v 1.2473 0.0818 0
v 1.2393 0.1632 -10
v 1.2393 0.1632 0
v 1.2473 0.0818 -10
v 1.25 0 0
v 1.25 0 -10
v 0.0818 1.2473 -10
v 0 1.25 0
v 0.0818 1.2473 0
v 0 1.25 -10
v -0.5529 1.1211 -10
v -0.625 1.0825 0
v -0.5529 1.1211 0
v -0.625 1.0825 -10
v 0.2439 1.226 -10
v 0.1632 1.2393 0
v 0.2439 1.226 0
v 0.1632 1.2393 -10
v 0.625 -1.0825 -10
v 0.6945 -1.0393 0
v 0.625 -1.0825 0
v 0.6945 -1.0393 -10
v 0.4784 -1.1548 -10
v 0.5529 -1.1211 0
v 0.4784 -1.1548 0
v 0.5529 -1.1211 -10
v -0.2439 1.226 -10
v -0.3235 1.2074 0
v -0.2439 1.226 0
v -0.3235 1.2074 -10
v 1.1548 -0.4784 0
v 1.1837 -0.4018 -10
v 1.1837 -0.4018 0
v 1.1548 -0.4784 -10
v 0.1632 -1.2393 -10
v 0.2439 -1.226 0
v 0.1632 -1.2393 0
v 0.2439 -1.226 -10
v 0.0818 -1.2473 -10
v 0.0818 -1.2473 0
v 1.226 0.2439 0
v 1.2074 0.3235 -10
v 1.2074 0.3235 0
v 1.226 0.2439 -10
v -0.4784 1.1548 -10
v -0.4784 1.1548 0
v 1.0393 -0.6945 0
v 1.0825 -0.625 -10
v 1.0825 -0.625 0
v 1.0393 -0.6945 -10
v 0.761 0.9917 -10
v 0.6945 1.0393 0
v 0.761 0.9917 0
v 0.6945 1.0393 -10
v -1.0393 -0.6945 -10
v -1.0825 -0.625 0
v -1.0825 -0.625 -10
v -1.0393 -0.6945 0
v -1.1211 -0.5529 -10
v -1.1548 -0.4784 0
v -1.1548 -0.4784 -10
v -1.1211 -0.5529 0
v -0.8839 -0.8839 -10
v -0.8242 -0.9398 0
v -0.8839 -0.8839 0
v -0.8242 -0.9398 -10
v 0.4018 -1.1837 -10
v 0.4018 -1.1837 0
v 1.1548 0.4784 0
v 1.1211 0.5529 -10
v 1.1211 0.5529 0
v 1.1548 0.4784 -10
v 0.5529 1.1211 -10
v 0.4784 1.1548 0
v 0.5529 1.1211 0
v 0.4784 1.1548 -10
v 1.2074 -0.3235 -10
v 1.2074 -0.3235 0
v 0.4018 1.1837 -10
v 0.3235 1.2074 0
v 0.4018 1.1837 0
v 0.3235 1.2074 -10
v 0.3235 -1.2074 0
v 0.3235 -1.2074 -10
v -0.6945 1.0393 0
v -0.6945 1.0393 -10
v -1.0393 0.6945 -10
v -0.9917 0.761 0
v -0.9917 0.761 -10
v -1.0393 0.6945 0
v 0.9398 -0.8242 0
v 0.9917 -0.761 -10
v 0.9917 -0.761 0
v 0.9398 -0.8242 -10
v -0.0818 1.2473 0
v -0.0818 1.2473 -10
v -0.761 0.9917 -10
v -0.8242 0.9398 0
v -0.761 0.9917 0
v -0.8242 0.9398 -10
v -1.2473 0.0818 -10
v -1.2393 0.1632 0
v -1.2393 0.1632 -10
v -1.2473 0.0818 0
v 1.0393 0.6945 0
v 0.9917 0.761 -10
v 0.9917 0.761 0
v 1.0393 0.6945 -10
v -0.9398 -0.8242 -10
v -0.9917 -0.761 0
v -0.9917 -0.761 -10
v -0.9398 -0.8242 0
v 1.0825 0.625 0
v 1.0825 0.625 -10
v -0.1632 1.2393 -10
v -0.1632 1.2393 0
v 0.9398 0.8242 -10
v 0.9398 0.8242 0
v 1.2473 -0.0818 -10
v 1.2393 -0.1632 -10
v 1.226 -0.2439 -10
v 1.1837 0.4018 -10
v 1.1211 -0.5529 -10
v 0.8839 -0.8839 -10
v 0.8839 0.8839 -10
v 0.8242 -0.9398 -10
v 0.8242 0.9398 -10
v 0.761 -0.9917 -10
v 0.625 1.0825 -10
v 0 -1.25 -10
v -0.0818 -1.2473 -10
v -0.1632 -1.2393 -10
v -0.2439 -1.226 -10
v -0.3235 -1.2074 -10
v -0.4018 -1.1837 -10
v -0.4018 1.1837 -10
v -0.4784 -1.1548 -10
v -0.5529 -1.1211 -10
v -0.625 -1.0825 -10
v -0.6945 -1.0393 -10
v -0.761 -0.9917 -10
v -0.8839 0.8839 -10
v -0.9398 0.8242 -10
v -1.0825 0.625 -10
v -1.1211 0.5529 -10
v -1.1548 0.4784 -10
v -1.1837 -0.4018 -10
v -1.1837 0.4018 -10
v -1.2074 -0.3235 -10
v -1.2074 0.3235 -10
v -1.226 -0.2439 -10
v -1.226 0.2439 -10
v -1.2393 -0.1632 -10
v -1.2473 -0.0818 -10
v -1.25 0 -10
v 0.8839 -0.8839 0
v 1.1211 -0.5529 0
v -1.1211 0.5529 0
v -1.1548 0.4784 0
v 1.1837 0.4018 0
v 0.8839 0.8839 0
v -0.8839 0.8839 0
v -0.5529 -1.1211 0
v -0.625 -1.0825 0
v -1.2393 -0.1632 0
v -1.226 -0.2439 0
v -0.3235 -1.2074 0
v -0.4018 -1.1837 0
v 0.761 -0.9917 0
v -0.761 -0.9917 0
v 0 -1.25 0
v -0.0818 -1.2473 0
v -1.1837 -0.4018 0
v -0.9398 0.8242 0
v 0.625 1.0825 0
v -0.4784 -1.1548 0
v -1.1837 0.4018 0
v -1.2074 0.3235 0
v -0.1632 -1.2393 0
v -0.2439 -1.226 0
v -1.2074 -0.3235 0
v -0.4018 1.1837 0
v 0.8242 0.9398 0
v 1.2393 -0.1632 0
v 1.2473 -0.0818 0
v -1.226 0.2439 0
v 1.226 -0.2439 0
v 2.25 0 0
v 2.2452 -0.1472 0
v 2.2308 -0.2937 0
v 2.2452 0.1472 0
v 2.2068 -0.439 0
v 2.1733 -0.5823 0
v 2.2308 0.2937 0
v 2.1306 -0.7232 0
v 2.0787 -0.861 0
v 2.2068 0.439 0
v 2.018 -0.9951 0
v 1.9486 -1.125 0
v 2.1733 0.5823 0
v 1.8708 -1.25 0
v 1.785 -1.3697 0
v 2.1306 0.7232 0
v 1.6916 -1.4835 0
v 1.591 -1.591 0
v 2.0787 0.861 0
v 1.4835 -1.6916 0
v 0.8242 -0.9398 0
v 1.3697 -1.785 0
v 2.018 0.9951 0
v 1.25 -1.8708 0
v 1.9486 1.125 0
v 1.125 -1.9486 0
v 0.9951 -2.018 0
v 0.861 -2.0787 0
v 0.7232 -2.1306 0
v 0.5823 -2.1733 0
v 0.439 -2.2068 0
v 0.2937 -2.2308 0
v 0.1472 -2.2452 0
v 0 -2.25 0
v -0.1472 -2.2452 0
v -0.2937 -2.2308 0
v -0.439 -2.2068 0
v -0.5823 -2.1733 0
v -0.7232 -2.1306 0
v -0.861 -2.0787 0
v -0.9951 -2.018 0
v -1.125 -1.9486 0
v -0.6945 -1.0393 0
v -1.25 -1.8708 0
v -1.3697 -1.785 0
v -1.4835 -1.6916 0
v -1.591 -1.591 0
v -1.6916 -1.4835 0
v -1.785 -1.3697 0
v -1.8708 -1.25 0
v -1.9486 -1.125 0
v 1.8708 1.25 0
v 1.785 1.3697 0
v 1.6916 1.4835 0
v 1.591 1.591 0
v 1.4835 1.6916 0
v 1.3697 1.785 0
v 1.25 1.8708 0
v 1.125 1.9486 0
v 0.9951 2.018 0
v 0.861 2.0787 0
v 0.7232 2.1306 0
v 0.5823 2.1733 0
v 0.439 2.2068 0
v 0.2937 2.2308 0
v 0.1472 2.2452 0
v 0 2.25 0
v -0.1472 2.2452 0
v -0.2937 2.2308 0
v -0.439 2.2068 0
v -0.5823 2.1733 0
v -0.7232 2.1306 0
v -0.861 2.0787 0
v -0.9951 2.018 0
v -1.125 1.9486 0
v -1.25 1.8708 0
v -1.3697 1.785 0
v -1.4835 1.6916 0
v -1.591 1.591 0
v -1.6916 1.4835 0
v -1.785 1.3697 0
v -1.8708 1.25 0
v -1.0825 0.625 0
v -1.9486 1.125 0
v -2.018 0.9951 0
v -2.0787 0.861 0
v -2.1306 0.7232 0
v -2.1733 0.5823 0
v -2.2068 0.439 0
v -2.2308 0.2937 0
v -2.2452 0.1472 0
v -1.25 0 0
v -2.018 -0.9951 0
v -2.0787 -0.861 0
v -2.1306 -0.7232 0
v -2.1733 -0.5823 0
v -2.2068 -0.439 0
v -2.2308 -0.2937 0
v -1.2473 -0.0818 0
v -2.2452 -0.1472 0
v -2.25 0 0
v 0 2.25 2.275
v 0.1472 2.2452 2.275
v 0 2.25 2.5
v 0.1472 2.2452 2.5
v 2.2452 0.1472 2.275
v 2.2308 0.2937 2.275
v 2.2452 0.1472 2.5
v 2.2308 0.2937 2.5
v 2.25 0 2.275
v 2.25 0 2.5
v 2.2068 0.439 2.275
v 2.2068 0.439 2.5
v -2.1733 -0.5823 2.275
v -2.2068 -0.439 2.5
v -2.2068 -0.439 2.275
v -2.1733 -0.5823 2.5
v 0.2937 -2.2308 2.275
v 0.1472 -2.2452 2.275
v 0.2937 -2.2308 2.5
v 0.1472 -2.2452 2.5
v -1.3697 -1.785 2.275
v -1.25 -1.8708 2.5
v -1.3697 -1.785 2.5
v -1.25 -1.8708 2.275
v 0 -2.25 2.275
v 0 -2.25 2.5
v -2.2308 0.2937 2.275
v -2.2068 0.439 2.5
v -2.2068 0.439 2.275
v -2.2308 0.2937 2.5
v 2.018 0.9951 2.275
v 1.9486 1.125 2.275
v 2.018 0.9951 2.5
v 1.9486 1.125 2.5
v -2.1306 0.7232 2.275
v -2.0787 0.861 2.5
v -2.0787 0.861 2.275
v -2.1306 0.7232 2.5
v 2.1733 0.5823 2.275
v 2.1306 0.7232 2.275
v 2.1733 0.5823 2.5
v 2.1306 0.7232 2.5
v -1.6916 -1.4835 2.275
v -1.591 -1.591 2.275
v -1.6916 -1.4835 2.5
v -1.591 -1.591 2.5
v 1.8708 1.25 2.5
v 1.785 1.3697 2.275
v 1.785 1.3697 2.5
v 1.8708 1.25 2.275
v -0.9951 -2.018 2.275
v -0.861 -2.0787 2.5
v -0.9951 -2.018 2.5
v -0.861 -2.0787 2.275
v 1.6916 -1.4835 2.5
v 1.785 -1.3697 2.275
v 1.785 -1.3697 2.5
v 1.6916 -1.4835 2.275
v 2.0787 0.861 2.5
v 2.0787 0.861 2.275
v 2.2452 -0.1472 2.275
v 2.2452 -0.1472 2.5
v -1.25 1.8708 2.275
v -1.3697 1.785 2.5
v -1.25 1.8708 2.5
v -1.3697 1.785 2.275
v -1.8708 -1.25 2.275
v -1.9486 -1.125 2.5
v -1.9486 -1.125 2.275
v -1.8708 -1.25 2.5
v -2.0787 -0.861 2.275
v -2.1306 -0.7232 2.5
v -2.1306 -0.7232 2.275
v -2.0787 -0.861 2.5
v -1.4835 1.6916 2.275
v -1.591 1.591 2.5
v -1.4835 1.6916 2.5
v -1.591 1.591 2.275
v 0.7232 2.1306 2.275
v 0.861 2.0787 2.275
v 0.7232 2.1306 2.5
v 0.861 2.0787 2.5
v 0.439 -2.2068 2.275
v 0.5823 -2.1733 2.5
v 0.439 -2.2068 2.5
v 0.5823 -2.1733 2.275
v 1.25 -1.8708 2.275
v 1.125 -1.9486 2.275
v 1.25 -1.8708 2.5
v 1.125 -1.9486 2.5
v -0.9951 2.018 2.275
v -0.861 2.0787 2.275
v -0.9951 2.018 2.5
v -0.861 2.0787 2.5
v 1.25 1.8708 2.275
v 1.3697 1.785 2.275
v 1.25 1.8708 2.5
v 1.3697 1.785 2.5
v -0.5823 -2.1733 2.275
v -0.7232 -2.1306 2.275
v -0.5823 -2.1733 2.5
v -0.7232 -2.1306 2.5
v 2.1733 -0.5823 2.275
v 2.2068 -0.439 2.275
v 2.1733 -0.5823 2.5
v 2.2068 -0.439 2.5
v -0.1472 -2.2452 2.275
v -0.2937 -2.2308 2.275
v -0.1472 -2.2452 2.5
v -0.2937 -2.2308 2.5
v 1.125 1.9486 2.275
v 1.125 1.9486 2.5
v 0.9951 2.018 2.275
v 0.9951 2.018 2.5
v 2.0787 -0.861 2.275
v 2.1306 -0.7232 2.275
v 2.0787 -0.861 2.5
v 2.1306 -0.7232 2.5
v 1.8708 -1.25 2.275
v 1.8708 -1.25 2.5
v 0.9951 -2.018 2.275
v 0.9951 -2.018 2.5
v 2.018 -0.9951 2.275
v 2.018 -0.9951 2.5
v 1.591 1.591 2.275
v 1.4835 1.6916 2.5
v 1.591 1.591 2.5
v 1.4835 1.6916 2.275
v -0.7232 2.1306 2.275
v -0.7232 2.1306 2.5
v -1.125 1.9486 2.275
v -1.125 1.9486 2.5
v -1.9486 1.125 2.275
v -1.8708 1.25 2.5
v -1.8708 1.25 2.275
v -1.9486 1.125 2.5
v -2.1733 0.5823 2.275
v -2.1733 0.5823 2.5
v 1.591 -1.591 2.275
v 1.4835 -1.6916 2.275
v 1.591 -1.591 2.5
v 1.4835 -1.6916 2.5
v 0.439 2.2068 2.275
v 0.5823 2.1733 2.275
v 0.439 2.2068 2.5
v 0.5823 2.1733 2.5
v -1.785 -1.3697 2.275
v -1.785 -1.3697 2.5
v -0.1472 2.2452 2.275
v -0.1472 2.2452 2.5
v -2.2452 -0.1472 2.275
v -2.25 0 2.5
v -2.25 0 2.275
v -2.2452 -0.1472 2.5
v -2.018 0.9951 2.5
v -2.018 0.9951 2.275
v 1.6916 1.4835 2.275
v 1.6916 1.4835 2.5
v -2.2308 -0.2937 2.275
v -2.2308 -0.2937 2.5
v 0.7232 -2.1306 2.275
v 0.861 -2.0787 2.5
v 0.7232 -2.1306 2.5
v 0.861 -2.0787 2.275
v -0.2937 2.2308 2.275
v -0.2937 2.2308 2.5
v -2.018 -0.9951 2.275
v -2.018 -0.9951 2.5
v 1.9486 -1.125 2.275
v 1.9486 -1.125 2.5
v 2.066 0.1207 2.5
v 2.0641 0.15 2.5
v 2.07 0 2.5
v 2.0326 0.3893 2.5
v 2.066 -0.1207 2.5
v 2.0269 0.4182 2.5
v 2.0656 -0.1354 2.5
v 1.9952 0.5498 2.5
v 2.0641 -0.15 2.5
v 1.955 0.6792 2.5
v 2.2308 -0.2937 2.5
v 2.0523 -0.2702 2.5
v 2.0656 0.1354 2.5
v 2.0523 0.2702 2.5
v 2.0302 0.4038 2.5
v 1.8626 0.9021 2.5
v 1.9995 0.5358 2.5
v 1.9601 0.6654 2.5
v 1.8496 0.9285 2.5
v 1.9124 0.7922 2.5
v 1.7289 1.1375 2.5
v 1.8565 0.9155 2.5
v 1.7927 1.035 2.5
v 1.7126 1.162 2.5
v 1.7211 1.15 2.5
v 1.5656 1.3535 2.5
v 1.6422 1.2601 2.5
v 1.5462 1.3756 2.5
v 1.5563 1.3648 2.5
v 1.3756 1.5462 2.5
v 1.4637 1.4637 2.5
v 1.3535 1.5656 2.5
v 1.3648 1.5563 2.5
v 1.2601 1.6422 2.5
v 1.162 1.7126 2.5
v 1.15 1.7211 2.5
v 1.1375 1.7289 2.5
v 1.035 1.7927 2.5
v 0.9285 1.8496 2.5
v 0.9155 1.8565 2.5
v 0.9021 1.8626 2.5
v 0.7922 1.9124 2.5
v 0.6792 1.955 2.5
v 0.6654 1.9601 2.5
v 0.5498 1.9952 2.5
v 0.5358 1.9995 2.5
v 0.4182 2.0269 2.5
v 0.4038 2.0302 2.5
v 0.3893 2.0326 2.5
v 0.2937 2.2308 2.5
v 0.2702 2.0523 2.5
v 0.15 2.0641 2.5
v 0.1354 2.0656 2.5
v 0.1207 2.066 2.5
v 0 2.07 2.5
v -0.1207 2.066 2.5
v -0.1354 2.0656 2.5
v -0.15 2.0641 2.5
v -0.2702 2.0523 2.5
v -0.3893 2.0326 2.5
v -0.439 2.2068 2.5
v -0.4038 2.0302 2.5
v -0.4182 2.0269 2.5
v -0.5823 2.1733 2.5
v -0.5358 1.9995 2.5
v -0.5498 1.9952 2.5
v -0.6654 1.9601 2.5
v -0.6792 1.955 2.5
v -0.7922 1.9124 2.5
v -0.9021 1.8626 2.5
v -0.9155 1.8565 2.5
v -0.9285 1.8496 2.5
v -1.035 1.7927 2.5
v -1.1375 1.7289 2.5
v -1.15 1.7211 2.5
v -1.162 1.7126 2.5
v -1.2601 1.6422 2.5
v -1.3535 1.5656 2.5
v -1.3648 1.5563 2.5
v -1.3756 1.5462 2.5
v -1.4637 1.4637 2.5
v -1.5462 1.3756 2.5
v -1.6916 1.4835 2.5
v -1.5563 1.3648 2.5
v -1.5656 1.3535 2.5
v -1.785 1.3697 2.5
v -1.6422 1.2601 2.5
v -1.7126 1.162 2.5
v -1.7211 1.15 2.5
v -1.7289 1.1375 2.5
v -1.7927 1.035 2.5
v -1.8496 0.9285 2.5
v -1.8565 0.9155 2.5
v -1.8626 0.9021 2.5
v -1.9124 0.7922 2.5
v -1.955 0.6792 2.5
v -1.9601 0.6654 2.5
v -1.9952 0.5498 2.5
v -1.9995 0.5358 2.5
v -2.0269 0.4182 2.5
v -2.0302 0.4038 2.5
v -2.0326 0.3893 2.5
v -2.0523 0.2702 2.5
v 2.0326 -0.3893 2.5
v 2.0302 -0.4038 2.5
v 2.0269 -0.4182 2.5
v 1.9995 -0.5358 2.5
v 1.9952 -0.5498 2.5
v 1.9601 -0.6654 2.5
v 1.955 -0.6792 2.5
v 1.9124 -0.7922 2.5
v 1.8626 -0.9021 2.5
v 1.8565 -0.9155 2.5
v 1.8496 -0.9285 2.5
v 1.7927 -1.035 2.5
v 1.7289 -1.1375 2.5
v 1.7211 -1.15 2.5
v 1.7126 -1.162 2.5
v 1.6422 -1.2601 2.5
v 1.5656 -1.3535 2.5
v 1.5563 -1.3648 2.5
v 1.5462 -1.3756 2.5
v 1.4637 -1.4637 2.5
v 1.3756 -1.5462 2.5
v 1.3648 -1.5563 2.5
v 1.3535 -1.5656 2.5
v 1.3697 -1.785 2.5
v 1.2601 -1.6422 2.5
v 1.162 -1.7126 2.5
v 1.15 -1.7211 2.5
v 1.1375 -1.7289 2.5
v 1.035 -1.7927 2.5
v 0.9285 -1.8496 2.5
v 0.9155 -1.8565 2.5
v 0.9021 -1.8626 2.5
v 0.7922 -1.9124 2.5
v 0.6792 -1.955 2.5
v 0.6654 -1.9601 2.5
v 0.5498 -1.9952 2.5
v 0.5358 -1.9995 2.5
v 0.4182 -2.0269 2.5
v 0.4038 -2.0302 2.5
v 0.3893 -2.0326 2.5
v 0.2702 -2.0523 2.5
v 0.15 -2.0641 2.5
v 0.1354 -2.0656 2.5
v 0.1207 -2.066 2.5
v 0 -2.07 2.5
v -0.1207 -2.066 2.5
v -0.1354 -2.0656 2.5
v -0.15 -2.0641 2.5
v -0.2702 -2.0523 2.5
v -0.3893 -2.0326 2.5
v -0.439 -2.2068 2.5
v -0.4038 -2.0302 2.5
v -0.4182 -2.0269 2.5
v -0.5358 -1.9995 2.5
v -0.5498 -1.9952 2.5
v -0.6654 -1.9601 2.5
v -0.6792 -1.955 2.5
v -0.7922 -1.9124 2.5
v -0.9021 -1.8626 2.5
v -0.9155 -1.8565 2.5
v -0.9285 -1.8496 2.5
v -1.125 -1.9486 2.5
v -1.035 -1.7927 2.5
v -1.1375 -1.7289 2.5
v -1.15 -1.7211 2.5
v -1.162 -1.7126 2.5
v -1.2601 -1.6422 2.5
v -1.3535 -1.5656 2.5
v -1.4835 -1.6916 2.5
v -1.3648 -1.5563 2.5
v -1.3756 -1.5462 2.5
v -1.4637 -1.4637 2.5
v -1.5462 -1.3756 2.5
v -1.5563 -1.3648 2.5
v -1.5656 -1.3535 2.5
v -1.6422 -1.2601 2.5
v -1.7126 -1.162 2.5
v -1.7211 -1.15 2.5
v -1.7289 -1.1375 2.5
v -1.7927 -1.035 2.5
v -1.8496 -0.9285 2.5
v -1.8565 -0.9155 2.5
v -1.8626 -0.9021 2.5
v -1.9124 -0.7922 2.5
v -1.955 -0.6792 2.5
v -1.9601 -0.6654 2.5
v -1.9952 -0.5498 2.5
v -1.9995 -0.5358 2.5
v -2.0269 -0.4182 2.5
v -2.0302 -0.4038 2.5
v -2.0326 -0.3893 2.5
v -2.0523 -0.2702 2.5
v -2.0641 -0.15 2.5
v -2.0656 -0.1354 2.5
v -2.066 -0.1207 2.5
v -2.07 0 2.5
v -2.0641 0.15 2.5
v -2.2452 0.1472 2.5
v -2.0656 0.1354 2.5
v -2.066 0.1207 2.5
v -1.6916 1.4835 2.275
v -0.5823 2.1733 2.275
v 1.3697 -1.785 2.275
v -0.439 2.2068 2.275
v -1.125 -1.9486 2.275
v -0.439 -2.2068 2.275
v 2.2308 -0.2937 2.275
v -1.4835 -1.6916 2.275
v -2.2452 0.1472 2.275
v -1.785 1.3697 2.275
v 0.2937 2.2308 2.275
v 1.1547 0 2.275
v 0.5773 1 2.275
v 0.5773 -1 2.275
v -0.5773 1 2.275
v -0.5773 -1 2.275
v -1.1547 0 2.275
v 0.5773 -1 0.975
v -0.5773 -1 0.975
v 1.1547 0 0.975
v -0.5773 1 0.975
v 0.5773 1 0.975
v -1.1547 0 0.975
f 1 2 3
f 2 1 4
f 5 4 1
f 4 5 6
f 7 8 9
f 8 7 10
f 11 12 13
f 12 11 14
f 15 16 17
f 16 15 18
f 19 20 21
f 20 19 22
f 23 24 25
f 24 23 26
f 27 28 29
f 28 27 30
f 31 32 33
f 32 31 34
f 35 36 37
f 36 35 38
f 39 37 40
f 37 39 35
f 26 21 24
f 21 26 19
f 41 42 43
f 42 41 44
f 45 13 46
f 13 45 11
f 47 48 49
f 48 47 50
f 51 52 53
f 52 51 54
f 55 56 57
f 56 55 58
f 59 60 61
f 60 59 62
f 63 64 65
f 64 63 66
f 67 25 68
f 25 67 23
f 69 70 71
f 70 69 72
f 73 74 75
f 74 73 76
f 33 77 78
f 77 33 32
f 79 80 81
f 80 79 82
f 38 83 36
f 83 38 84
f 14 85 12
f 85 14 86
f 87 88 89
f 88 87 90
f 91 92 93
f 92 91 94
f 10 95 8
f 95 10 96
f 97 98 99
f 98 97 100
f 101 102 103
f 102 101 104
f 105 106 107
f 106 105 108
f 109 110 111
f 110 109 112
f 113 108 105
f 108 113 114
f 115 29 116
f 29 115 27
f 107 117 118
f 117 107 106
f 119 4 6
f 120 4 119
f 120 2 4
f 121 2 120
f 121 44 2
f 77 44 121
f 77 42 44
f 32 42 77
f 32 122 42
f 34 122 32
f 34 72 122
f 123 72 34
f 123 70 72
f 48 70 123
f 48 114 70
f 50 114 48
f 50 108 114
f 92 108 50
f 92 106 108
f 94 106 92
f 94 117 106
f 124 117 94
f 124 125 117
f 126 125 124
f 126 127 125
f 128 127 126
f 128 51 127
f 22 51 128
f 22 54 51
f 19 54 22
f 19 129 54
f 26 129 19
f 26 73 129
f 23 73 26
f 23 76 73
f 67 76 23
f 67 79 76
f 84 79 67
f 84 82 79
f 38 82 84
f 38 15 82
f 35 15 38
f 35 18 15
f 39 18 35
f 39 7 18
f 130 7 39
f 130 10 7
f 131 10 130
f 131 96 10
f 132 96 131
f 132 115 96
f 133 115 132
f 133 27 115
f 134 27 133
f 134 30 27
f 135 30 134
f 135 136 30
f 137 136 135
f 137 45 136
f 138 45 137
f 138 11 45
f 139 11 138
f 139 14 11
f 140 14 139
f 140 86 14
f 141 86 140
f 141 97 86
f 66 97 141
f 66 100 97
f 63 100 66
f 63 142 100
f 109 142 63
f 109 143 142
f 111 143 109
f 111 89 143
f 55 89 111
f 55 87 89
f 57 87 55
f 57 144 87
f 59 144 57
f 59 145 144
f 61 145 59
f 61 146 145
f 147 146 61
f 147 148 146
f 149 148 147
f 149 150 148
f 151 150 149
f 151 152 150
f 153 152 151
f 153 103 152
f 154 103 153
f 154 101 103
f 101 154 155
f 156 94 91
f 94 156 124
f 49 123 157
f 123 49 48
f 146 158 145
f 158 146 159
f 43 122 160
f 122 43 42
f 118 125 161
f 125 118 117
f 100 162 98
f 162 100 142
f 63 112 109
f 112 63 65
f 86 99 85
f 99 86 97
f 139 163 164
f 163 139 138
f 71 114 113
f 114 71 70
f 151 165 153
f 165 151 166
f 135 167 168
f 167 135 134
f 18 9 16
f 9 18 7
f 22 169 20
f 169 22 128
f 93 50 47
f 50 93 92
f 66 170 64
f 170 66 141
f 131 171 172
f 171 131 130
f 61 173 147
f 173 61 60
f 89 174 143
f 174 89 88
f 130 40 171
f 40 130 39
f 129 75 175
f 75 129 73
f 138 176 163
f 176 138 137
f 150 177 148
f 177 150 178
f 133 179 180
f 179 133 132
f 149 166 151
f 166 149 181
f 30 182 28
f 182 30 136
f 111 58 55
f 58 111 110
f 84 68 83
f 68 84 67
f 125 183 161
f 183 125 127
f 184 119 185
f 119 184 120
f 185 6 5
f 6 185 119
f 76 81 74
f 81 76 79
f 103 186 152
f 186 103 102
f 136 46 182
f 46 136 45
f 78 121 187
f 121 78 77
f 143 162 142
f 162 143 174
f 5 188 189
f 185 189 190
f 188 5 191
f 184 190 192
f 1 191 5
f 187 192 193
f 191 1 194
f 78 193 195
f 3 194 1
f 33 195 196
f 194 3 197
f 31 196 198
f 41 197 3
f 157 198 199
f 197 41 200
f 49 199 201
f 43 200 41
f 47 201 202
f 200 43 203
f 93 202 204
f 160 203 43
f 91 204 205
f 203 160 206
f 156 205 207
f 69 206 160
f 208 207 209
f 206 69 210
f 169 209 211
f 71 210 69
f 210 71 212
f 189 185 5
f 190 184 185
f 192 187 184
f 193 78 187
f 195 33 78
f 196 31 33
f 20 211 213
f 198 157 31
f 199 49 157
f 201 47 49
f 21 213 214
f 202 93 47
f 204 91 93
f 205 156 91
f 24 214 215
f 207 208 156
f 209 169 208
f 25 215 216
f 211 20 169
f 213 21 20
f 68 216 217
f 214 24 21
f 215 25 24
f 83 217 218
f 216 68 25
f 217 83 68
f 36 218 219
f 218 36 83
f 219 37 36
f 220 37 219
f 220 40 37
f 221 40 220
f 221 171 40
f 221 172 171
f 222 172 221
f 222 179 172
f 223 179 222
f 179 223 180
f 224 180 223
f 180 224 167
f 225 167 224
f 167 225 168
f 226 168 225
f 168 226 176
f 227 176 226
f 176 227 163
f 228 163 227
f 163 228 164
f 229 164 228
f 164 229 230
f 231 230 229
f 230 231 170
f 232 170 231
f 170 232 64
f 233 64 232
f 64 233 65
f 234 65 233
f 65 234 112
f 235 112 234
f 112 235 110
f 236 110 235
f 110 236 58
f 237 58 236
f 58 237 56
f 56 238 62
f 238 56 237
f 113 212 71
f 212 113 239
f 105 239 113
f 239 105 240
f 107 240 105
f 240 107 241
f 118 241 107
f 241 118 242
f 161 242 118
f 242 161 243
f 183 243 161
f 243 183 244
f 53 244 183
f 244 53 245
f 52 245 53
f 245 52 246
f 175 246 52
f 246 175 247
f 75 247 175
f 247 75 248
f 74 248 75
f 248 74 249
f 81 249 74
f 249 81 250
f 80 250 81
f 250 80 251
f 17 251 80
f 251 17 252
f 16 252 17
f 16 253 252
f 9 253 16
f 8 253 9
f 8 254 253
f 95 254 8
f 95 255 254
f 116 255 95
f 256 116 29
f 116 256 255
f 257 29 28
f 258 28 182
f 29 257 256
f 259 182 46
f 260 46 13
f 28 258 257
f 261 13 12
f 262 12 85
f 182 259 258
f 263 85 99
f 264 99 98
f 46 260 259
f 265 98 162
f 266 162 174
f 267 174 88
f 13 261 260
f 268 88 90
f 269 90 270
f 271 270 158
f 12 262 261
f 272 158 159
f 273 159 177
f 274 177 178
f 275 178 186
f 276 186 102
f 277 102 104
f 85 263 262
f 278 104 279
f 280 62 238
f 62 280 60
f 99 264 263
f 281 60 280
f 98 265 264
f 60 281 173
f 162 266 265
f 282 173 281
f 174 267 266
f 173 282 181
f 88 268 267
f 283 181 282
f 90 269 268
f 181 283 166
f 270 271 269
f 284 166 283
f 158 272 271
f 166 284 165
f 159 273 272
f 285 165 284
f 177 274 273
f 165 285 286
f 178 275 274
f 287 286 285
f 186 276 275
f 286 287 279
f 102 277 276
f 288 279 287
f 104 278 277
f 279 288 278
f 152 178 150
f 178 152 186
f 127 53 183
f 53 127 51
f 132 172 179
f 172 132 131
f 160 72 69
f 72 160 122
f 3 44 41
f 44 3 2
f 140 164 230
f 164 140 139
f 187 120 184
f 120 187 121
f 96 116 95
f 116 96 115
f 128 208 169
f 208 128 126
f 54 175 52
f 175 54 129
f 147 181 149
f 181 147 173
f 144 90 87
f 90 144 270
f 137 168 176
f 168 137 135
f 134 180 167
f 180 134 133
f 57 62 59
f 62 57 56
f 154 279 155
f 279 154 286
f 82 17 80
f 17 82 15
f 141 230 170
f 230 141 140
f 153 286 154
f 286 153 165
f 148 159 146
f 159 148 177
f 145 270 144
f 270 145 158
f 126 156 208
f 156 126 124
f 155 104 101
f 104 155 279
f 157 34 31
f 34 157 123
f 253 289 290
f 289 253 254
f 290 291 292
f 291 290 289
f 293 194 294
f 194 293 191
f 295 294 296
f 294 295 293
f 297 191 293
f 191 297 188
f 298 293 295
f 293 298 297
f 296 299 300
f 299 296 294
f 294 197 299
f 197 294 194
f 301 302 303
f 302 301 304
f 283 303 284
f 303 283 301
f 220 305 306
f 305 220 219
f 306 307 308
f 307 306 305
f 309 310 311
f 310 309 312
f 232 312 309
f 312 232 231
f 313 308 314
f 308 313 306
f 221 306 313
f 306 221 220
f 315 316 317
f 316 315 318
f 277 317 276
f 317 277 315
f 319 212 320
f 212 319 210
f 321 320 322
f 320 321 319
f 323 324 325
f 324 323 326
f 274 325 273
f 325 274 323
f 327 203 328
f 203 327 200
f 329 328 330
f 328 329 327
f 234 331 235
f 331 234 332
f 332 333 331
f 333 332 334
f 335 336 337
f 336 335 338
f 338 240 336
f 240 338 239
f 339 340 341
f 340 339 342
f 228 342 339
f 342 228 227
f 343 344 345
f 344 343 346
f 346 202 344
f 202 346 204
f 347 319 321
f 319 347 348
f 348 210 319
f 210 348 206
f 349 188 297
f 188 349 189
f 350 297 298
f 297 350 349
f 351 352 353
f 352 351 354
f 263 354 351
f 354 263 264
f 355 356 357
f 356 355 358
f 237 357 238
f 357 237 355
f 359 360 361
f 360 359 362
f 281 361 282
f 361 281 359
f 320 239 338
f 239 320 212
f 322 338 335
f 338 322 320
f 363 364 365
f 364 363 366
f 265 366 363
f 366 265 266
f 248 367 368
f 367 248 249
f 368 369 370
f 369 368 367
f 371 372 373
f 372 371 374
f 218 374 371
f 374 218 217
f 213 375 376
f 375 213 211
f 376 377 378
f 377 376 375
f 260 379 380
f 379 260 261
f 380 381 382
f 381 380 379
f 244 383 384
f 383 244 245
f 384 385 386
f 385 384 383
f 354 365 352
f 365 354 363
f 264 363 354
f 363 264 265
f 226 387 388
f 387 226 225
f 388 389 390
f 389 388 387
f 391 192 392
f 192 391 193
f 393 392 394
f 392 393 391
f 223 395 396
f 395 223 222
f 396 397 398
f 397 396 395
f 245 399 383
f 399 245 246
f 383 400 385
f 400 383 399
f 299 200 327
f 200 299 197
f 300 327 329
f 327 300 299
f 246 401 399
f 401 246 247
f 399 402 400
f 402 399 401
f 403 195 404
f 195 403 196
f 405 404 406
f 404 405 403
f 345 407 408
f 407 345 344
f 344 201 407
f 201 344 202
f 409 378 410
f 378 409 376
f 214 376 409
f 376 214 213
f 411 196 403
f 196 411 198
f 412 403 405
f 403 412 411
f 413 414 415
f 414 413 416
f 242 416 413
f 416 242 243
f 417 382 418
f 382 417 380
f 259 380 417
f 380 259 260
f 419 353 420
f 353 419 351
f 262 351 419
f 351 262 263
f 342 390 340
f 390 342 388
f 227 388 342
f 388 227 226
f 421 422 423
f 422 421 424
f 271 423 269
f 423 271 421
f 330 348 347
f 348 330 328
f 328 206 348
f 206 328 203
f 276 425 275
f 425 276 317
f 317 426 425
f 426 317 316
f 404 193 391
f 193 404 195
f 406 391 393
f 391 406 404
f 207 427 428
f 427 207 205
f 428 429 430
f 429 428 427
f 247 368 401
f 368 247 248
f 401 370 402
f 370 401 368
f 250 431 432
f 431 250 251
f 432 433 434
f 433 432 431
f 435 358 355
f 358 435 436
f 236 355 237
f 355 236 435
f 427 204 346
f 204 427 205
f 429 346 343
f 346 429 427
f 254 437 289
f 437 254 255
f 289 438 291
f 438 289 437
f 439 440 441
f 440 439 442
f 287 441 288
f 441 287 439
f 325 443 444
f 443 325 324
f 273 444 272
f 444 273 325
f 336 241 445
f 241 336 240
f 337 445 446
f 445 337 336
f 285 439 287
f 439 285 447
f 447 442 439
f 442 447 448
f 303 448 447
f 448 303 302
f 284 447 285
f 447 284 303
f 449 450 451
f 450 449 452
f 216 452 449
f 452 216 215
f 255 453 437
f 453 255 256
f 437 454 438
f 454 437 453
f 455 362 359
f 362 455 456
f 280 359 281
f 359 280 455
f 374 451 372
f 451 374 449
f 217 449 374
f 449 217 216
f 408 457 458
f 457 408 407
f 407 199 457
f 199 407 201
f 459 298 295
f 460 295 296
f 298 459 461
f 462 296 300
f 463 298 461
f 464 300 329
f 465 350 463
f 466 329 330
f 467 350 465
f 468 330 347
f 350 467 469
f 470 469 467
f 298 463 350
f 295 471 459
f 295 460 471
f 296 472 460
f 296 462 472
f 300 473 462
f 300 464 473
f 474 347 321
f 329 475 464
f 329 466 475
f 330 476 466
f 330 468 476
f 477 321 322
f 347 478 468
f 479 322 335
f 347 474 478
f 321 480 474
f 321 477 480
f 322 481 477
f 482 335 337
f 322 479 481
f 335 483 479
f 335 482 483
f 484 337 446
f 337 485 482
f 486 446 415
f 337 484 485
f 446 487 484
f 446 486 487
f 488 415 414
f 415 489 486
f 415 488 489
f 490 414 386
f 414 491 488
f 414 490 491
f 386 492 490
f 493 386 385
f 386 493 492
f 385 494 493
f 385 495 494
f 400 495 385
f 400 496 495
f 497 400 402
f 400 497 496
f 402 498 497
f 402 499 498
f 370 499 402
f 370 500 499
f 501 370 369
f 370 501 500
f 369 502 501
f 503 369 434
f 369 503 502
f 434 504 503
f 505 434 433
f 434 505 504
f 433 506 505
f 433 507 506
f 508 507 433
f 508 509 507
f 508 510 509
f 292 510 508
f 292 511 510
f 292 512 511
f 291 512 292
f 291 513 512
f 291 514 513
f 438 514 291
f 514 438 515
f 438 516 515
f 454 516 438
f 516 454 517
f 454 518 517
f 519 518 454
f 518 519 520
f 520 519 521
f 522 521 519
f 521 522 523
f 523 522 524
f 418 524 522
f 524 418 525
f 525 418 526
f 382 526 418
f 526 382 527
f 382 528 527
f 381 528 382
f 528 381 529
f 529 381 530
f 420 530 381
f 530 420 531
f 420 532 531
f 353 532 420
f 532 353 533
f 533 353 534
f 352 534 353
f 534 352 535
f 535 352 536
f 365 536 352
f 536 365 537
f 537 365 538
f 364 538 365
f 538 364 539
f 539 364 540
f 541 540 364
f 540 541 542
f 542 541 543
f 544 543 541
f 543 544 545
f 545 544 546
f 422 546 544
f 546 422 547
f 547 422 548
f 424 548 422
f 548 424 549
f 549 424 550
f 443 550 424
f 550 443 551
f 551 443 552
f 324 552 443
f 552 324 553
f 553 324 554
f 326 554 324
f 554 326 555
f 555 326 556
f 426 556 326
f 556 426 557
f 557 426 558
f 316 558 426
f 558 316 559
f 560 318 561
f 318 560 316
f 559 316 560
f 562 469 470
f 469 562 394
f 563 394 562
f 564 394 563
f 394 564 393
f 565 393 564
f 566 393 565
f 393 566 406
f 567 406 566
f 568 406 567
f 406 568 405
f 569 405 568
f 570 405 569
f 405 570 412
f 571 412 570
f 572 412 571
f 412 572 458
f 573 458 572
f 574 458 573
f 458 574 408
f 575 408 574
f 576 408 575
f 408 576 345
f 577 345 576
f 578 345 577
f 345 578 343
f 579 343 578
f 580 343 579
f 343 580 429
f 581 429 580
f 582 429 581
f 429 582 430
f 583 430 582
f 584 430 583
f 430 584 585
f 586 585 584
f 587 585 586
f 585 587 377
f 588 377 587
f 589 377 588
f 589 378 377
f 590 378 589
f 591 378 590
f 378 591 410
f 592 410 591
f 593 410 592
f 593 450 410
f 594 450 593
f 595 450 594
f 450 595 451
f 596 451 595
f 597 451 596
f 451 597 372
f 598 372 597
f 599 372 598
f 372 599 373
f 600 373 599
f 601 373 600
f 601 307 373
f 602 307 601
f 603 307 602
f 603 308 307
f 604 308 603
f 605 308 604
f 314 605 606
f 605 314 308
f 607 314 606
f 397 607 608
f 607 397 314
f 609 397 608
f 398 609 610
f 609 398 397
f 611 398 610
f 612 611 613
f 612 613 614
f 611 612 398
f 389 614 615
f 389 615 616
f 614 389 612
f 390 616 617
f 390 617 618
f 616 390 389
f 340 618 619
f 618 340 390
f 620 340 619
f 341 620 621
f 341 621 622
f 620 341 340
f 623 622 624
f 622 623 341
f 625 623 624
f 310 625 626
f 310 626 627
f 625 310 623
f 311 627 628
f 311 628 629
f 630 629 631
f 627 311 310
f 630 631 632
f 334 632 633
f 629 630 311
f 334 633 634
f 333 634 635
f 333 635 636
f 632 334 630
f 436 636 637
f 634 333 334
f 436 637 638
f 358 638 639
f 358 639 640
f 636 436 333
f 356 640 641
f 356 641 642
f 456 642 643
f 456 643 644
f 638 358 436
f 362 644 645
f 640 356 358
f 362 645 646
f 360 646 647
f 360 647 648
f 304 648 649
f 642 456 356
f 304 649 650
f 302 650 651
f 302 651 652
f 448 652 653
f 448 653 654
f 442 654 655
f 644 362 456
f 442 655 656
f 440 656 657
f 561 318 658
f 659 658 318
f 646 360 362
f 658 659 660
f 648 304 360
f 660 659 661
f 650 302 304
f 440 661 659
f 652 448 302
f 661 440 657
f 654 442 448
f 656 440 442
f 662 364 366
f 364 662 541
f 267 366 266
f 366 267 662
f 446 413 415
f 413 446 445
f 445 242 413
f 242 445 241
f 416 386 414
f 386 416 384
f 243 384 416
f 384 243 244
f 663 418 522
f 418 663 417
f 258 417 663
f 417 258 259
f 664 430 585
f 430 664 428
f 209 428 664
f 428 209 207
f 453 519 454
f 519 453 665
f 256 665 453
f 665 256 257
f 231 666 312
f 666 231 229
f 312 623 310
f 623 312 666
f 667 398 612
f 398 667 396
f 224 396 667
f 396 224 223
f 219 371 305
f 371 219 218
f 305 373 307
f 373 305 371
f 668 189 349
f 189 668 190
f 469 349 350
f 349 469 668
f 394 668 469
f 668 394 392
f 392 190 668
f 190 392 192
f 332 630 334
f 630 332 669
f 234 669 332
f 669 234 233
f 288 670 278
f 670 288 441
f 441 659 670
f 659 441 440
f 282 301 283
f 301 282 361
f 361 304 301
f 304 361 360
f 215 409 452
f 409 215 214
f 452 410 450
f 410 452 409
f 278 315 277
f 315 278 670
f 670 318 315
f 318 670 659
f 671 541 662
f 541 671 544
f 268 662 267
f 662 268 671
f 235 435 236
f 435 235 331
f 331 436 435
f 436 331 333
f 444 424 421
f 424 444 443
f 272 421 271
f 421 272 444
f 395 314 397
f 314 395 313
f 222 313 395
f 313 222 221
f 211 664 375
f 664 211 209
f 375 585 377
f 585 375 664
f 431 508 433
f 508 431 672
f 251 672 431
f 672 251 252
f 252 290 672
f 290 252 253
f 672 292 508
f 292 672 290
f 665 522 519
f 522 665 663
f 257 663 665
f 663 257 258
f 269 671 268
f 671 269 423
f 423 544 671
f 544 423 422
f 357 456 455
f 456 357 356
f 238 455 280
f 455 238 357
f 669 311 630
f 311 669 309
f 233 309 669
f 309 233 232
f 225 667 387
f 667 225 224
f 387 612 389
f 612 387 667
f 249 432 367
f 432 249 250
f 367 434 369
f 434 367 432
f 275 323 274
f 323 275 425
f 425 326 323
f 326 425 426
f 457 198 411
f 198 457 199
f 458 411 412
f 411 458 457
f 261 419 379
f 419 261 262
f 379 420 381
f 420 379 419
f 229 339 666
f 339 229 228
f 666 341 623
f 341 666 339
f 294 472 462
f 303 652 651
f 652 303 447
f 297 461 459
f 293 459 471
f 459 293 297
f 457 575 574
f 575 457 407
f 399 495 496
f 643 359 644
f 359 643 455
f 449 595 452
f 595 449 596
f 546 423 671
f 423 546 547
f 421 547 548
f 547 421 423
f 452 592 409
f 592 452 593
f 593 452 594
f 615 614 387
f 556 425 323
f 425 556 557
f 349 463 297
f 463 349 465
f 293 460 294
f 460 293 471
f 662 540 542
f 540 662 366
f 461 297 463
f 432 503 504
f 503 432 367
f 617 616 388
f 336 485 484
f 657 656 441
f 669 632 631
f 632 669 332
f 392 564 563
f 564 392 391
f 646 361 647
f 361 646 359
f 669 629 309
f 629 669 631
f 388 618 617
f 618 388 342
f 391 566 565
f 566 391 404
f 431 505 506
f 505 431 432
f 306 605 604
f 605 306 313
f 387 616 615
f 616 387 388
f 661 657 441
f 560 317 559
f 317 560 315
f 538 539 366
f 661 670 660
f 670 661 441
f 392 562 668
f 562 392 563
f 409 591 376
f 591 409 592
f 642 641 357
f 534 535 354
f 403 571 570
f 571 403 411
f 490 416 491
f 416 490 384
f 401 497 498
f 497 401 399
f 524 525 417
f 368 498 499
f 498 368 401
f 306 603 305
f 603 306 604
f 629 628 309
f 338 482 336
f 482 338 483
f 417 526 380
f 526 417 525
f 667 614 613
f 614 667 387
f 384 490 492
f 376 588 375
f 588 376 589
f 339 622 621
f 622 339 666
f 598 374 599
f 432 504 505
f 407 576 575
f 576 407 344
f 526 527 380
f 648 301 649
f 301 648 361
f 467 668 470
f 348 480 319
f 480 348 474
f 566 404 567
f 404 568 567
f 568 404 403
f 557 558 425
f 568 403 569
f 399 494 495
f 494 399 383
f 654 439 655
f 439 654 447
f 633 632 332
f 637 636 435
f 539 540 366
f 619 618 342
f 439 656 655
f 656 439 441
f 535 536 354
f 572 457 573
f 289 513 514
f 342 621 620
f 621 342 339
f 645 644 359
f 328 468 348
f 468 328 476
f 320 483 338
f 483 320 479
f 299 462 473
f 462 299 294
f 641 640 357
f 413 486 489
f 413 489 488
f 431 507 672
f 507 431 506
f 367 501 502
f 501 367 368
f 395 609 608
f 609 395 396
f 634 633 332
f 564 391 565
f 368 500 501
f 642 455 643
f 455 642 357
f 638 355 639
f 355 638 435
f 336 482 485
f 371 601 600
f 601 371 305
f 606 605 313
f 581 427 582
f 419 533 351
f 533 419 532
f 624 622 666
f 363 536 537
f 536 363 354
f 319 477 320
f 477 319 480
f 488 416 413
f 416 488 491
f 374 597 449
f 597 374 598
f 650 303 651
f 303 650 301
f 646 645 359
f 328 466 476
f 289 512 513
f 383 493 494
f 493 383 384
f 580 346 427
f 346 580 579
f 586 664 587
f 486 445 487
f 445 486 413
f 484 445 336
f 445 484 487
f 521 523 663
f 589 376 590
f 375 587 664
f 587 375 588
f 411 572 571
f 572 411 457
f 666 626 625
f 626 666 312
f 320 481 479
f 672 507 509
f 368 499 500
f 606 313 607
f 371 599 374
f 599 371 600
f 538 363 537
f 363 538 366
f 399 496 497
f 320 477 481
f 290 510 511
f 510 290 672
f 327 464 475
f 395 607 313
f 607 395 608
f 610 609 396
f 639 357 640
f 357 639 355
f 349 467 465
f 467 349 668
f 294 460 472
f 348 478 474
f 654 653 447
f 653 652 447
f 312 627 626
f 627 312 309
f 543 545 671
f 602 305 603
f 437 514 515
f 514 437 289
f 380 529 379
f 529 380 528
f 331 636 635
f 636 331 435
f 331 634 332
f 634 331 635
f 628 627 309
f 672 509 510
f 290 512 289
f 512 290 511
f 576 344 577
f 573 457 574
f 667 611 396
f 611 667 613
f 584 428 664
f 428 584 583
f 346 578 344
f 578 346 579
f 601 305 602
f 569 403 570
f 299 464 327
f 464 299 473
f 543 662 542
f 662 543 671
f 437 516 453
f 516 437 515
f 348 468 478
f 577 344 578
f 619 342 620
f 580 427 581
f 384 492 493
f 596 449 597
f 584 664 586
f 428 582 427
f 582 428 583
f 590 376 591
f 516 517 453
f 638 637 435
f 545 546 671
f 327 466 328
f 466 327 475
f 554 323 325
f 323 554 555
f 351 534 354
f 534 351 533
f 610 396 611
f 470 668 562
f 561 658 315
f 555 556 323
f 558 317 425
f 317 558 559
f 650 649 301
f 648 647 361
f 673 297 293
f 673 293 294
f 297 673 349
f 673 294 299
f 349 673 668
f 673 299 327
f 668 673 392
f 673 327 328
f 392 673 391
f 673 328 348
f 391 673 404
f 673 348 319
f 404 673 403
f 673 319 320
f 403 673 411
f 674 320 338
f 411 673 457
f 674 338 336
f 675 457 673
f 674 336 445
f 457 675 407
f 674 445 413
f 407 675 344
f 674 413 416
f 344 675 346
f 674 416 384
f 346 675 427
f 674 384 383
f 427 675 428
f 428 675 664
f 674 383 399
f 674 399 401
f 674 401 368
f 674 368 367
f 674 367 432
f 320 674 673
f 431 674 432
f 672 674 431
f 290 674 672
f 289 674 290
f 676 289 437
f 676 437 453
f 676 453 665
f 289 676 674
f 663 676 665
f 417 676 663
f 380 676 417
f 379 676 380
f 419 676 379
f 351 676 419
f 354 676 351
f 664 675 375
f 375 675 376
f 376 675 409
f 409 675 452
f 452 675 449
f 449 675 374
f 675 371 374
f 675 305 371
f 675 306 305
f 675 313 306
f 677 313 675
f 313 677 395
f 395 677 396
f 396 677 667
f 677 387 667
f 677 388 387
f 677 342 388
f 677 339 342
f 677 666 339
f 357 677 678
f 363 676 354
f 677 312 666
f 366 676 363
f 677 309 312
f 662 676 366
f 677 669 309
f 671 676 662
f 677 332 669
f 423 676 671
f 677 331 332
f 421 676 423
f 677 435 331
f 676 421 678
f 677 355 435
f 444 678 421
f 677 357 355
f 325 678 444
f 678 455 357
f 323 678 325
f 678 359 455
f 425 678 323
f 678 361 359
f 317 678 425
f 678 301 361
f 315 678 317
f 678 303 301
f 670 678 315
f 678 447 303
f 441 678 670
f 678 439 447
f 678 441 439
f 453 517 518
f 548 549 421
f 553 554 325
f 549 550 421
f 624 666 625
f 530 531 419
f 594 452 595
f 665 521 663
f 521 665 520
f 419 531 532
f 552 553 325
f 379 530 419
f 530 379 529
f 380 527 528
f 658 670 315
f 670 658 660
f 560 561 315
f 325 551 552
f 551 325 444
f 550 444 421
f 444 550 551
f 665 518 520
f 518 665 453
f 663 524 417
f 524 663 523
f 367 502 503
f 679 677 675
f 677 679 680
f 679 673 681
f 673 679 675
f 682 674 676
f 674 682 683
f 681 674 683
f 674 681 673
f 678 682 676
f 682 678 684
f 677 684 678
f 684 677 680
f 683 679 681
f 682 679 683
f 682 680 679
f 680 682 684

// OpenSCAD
// Socket head cap screw (simplified, no threads)
// Target: shank Ø2.5mm, length under head 10mm
//         head Ø4.5mm, head height 2.5mm, hex socket recess

$fn = 96;

// Parameters (mm)
nominal_diameter_mm   = 2.5;
length_under_head_mm  = 10;

head_diameter_mm      = 4.5;
head_height_mm        = 2.5;

socket_hex_af_mm      = 2.0;   // across flats
socket_depth_mm       = 1.5;

chamfer_tip_mm        = 0.2;
chamfer_head_top_mm   = 0.2;

overlap_mm            = 0.05;

// Helpers
function hex_circumradius_from_af(af) = af / (2 * cos(30)); // R = AF/(2cos30)

// Hex prism for socket cut
module hex_prism(af, h, center=false) {
  r = hex_circumradius_from_af(af);
  cylinder(h=h, r=r, center=center, $fn=6);
}

// Main screw (ONE connected solid)
module socket_head_cap_screw() {
  shank_r = nominal_diameter_mm / 2;
  head_r  = head_diameter_mm / 2;

  // Z layout: head spans [0, head_height], shank spans [-length, 0]
  difference() {
    union() {
      // Shank
      translate([0, 0, -length_under_head_mm/2])
        cylinder(h=length_under_head_mm, r=shank_r, center=true);

      // Tip chamfer (conical)
      translate([0, 0, -length_under_head_mm + chamfer_tip_mm/2])
        cylinder(h=chamfer_tip_mm, r1=shank_r, r2=0, center=true);

      // Head
      translate([0, 0, head_height_mm/2])
        cylinder(h=head_height_mm, r=head_r, center=true);
    }

    // Top edge chamfer (remove a thin conical ring at the top)
    translate([0, 0, head_height_mm - chamfer_head_top_mm/2])
      cylinder(h=chamfer_head_top_mm + overlap_mm, r1=head_r, r2=head_r - chamfer_head_top_mm, center=true);

    // Hex socket recess (cut from top down)
    translate([0, 0, head_height_mm - socket_depth_mm/2])
      hex_prism(socket_hex_af_mm, socket_depth_mm + overlap_mm, center=true);
  }
}

socket_head_cap_screw();
